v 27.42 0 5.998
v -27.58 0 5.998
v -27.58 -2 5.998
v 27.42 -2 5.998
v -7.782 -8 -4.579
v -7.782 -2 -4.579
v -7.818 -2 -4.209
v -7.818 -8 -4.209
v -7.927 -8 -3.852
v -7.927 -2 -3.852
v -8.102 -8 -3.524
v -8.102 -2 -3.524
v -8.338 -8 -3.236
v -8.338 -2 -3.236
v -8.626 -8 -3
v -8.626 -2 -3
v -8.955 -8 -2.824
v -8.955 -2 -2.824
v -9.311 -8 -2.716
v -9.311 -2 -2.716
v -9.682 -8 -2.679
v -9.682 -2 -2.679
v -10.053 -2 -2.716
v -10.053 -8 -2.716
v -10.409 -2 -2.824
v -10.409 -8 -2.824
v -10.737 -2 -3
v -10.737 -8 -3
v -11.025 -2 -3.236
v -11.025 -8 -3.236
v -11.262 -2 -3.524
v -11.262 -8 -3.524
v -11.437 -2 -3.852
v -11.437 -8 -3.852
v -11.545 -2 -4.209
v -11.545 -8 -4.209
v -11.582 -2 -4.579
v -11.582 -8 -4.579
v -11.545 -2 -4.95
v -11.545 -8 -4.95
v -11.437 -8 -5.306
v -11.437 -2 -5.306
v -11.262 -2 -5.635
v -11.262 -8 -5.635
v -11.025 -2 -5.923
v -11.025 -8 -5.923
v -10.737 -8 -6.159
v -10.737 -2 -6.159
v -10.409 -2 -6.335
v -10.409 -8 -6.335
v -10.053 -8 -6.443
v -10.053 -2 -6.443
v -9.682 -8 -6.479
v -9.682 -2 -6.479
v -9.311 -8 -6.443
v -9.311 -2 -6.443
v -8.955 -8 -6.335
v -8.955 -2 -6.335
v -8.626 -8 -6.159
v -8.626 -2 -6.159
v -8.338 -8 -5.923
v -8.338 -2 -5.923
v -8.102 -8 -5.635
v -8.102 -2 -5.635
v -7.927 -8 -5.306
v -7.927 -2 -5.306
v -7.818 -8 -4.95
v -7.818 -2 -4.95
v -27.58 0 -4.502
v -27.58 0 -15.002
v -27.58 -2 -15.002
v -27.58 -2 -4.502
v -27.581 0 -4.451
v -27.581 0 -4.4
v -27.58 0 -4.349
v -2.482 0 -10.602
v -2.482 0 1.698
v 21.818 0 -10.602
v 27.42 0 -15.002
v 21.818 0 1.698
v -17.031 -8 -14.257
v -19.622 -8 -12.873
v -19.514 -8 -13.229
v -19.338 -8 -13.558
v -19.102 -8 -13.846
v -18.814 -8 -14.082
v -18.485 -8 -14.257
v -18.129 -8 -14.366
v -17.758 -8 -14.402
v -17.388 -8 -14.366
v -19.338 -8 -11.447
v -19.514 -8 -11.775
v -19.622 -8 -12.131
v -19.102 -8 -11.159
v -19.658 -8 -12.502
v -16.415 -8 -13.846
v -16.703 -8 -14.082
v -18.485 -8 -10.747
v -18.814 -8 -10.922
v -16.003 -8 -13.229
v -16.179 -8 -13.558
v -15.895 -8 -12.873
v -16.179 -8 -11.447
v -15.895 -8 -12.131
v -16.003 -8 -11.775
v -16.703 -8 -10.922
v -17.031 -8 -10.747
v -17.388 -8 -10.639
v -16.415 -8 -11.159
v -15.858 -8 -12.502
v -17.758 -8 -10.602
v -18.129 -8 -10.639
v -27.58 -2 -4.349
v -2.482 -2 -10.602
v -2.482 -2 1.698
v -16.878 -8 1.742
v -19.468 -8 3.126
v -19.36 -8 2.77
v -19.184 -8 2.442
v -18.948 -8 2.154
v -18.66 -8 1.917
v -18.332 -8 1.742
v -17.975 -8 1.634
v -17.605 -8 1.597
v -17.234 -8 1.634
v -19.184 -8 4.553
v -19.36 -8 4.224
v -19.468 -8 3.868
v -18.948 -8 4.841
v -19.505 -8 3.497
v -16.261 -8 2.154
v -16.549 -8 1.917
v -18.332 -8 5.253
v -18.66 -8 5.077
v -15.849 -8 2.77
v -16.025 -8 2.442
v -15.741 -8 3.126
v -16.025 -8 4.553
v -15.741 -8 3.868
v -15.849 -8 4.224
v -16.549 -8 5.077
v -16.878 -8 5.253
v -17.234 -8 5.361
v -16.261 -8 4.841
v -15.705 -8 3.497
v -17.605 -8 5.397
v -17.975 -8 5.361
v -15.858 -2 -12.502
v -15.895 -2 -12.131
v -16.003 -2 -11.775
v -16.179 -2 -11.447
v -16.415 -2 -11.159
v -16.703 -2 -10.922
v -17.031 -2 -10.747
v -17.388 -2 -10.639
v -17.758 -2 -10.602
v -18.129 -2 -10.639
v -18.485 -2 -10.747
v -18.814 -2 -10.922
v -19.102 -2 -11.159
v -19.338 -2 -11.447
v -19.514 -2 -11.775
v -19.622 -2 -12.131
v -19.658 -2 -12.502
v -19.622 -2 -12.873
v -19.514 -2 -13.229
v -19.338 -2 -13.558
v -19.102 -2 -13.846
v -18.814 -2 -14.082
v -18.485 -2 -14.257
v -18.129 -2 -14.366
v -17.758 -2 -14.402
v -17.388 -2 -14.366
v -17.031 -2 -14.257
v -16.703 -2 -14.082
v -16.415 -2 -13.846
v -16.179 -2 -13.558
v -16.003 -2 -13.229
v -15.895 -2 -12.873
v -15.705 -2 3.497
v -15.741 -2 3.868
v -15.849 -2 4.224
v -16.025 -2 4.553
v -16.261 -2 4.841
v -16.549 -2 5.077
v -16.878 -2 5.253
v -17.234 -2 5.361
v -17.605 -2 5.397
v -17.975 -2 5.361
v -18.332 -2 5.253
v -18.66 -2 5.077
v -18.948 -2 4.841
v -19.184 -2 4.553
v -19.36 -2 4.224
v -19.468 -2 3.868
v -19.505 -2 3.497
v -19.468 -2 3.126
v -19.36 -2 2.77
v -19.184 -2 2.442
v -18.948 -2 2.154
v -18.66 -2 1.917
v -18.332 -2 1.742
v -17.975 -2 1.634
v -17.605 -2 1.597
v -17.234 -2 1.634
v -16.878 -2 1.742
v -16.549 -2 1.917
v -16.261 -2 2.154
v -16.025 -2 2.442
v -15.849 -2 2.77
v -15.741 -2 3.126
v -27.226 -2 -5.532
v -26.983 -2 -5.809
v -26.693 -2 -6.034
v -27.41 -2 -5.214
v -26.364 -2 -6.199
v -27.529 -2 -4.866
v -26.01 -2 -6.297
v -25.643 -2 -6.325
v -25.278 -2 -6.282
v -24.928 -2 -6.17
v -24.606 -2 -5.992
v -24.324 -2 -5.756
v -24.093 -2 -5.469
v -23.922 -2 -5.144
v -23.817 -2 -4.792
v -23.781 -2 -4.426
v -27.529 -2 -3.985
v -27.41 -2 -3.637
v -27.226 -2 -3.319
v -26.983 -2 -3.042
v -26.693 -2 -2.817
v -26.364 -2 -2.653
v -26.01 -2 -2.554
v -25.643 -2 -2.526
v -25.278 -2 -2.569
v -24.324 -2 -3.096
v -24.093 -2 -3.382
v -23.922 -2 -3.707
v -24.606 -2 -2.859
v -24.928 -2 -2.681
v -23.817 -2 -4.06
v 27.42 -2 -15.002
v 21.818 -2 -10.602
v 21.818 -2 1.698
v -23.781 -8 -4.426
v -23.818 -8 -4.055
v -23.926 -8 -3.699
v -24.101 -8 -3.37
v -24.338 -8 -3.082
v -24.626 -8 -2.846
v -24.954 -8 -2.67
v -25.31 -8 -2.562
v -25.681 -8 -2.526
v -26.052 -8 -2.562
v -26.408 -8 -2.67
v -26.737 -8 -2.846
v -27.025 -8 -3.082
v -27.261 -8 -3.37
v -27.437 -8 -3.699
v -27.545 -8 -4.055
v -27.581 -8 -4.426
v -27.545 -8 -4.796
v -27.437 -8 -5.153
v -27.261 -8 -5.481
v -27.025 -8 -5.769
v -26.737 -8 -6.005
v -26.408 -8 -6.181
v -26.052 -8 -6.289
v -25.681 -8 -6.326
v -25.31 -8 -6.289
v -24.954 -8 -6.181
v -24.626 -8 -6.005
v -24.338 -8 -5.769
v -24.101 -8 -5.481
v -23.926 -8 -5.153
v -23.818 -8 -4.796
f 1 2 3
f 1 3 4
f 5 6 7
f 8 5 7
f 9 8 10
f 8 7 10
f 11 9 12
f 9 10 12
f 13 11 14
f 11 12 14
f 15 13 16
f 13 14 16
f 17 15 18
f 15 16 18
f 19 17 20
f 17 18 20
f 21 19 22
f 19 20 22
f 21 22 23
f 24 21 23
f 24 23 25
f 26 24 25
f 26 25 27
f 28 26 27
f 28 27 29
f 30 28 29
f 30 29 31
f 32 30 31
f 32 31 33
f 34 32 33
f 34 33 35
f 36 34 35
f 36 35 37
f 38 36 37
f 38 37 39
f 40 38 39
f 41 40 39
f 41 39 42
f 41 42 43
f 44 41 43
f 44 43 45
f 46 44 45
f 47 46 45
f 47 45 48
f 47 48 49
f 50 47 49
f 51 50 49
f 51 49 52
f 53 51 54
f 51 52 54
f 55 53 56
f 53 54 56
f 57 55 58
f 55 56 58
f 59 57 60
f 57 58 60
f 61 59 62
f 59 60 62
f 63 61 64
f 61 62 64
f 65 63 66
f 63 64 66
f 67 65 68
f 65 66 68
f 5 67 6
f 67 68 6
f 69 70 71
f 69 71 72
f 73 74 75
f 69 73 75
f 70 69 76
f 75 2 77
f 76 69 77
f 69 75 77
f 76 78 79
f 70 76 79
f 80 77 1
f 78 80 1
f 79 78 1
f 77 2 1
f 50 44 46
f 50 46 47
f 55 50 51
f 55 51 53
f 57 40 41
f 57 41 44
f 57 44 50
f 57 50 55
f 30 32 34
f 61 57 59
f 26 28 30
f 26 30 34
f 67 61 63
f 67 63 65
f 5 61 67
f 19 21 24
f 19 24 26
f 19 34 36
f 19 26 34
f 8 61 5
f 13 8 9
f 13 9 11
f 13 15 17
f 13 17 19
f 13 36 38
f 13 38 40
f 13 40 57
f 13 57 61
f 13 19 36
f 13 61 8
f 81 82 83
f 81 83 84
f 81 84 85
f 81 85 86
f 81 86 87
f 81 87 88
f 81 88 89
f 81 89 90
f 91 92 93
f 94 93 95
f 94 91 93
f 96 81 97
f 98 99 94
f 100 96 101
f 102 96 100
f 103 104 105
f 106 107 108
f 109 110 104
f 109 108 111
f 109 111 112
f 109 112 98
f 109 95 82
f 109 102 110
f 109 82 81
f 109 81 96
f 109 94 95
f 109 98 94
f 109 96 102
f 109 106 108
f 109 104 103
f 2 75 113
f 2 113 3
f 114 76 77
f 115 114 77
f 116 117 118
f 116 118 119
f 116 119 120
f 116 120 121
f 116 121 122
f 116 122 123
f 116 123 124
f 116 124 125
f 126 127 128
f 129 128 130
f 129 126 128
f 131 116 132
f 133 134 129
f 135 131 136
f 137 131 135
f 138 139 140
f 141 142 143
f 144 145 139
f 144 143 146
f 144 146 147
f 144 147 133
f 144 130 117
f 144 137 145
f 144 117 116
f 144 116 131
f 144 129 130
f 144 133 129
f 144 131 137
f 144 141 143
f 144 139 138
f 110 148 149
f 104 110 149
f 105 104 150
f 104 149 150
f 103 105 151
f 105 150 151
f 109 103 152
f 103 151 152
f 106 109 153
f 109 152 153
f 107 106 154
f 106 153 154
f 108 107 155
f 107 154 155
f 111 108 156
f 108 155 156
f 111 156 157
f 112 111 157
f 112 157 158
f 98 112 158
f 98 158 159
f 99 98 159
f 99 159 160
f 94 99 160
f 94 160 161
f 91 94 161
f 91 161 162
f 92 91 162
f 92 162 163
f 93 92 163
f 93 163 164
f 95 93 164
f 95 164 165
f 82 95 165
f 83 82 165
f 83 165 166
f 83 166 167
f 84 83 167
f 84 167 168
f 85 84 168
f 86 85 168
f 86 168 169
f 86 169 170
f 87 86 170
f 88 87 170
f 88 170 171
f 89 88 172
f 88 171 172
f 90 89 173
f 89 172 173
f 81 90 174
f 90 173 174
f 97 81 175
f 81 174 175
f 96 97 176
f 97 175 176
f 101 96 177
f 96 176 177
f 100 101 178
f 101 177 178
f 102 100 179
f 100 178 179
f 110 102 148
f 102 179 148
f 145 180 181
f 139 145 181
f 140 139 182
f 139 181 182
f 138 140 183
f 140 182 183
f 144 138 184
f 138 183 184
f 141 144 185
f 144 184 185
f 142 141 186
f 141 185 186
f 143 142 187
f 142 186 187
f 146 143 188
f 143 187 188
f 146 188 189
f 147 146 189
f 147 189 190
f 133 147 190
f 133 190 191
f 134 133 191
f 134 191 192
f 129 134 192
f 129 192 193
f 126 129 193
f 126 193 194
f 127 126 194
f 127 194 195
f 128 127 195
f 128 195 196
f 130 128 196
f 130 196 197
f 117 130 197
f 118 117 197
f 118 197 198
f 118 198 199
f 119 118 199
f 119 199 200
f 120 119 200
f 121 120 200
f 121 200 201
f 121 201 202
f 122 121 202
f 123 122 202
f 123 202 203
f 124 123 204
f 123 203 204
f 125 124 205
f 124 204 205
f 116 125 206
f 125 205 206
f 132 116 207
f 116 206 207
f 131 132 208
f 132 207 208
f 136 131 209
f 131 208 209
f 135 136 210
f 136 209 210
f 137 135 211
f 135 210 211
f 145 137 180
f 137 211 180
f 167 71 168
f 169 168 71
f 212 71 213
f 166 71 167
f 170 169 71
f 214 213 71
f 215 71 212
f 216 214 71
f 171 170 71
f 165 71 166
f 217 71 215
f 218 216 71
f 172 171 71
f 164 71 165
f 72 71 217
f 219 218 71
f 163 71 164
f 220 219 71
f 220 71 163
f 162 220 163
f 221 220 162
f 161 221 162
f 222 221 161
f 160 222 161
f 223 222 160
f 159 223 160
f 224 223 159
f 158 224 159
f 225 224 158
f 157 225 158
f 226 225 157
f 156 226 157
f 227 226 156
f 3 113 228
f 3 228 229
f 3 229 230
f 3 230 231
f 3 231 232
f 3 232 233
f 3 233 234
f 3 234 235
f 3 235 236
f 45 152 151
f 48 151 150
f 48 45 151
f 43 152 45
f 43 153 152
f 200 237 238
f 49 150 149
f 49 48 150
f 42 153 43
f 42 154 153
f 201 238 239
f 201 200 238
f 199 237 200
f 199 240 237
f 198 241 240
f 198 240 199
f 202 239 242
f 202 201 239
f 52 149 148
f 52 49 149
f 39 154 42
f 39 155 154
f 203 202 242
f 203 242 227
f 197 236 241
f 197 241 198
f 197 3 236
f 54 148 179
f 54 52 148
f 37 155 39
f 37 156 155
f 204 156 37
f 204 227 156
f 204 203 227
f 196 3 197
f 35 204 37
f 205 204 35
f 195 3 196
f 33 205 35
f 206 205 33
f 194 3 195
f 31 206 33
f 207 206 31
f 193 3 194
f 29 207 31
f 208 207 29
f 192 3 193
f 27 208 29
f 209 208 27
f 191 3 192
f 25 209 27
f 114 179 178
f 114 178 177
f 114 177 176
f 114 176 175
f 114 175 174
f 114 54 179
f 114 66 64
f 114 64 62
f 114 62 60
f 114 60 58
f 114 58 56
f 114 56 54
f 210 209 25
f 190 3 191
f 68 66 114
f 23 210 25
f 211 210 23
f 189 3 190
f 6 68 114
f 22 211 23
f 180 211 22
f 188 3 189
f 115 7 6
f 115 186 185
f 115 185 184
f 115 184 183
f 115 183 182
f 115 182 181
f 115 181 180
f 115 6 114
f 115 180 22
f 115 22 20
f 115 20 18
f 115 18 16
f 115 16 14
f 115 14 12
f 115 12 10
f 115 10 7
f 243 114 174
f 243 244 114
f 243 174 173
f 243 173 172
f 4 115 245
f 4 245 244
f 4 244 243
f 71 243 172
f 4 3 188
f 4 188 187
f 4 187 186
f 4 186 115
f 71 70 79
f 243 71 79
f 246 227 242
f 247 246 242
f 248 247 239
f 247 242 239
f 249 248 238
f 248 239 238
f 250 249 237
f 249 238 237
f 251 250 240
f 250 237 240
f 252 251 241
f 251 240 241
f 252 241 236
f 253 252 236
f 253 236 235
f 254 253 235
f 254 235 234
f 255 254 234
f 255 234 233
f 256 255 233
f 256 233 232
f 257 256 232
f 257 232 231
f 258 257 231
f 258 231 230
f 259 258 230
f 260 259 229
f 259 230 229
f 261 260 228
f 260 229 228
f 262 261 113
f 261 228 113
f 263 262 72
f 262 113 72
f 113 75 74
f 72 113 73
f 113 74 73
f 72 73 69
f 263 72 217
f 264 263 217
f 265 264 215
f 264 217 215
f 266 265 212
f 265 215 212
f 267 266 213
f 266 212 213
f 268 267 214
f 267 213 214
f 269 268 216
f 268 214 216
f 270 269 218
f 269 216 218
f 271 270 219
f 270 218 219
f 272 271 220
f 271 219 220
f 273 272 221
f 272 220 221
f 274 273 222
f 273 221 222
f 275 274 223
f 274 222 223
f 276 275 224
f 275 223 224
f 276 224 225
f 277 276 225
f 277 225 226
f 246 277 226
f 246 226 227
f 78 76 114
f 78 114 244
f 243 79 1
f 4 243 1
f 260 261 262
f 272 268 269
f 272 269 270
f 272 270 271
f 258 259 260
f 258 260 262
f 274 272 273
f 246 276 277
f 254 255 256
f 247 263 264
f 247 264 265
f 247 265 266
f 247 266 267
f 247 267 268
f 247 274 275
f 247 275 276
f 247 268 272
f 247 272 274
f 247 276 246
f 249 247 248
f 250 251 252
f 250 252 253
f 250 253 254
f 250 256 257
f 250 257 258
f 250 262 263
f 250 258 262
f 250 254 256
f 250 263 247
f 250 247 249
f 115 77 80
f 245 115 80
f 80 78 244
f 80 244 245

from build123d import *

# Parameters (mm, degrees)
F0_W     = 55
F0_H     = 21
F1_DEPTH = 2
F2_R     = 1.9
F3_DEPTH = 8
F4_W     = 24.3
F4_H     = 12.3
F5_DEPTH = 8.001


with BuildPart() as f1:
    # F0 (on Front) → F1 (new body)
    with BuildSketch(Plane.XZ):
        with Locations((-0.079613, -4.502098)):
            Rectangle(F0_W, F0_H)
    extrude(amount=F1_DEPTH)

    # F2 (on Front) → F3 (join)
    with BuildSketch(Plane.XZ):
        with Locations((-25.681152, -4.425638)):
            Circle(F2_R)
        with Locations((-17.604692, 3.497164)):
            Circle(F2_R)
        with Locations((-9.68189, -4.579296)):
            Circle(F2_R)
        with Locations((-17.75835, -12.502098)):
            Circle(F2_R)
    extrude(amount=F3_DEPTH)

    # F4 (on Front) → F5 (cut, through all)
    with BuildSketch(Plane.XZ):
        with Locations((9.66811, -4.452098)):
            Rectangle(F4_W, F4_H)
    extrude(amount=F5_DEPTH, mode=Mode.SUBTRACT)


solid = f1.part
